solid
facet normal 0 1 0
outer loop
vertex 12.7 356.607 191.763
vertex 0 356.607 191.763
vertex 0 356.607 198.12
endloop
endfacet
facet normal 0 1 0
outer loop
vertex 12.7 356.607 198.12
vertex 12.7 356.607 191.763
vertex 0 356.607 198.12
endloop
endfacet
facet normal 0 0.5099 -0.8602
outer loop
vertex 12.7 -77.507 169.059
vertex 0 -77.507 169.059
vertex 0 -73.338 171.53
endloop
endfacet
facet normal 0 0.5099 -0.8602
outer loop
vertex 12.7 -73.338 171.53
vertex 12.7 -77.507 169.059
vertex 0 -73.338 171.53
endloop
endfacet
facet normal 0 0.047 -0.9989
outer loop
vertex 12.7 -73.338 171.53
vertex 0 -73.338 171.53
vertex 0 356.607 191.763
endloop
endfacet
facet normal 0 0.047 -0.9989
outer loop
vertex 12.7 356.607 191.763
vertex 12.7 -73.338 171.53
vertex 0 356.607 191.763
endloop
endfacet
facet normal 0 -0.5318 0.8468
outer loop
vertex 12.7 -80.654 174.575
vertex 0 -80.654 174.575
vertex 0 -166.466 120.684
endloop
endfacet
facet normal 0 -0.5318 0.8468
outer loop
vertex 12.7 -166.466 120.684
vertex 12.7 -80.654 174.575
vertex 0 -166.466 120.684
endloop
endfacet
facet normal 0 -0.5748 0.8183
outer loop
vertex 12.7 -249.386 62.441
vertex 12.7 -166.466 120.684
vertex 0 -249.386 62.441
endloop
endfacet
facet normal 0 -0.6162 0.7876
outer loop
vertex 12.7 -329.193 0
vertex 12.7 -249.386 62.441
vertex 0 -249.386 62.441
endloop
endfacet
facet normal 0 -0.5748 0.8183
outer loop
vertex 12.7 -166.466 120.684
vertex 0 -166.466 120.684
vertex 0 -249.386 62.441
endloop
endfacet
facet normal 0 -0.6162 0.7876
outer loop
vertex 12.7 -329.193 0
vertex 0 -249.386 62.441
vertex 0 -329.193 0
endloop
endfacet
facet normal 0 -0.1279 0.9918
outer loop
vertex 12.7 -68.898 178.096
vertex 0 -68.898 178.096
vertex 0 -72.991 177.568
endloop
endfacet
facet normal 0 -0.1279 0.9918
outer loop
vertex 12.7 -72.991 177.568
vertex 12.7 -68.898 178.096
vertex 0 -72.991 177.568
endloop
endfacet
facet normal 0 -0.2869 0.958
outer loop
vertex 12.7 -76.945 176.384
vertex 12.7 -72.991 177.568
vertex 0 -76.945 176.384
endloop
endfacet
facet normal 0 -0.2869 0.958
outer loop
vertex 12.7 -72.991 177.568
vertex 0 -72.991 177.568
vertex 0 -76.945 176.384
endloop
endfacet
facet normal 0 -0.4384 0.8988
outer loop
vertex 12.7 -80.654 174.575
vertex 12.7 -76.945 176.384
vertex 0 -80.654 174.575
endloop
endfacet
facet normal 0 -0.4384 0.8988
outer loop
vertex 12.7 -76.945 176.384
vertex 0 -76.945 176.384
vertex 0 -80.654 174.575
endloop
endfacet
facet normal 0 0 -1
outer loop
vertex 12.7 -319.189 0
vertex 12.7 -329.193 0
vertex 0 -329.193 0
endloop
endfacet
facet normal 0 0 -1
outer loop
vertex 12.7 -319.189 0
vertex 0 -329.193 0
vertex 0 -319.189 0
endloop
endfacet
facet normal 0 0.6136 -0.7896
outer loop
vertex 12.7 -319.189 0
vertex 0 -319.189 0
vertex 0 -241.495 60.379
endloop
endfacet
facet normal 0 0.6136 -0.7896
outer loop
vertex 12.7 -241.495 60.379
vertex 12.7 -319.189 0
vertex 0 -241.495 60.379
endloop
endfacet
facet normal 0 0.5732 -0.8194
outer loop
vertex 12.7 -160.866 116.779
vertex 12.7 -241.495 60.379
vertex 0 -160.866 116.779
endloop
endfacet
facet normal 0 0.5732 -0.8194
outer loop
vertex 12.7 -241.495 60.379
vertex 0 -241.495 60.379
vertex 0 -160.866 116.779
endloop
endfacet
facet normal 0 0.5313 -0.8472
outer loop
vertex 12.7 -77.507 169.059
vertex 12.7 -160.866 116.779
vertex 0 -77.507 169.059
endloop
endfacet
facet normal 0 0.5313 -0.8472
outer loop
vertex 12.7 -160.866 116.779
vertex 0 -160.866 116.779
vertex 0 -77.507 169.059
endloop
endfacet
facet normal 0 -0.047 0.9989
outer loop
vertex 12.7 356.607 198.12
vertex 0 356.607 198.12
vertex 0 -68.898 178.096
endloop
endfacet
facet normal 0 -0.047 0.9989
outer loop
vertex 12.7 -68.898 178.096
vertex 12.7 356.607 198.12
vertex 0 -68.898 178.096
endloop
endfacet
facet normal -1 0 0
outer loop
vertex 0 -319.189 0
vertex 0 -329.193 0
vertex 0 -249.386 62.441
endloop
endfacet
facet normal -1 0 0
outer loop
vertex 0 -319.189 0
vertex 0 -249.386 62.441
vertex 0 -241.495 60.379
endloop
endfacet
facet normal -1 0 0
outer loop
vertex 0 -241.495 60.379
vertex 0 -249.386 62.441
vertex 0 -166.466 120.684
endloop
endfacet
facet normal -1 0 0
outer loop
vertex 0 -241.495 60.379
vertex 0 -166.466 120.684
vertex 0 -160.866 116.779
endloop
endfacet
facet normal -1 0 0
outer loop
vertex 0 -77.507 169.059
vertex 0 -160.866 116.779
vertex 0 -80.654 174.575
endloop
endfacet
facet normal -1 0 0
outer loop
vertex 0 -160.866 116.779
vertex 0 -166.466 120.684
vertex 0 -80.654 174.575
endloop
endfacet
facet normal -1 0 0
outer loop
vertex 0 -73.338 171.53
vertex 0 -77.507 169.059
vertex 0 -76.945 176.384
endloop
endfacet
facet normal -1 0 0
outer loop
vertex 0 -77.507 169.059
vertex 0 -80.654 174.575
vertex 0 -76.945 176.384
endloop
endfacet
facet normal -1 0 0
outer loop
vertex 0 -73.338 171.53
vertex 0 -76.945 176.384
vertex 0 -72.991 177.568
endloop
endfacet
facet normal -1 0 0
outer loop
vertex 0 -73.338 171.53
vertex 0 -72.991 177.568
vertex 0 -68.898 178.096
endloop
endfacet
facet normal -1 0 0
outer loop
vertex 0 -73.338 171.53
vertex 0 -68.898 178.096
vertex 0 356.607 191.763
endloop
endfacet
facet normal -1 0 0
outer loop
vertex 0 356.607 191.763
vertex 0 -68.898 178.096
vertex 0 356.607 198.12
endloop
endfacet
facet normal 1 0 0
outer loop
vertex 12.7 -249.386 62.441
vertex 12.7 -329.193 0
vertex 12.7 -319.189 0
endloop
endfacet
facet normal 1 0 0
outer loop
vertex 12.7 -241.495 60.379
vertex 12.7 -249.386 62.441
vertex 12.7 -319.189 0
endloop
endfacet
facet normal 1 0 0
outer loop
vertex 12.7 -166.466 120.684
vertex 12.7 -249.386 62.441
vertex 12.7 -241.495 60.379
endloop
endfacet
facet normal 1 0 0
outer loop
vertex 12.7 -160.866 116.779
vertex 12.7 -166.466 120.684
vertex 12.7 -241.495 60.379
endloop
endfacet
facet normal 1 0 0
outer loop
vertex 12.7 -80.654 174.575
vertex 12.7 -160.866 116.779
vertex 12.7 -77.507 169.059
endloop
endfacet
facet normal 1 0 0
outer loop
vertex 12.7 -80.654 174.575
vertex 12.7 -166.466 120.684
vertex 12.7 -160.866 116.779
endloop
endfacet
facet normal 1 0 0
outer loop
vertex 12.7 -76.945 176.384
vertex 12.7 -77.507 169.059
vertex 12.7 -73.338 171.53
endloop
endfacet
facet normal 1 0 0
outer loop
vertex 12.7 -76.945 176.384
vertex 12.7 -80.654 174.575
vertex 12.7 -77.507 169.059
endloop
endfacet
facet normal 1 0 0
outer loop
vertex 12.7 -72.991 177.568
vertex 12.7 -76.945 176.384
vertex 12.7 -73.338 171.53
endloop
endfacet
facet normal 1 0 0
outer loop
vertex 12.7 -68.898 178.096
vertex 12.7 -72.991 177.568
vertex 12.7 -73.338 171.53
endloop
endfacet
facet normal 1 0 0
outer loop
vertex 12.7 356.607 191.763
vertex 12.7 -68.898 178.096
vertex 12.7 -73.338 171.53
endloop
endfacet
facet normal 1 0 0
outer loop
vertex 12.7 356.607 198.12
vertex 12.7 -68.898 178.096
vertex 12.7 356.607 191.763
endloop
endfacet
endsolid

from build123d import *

# Parameters (mm, degrees)
F1_DEPTH = 12.7


with BuildPart() as f1:
    # F0 (on Right) → F1 (new body)
    with BuildSketch(Plane.YZ):
        with BuildLine():
            ThreePointArc((-68.898448, 178.096197), (-74.992037, 177.056382), (-80.653981, 174.575369))
            ThreePointArc((-80.653981, 174.575369), (-208.301311, 92.096861), (-329.192638, 0))
            Line((-329.192638, 0), (-319.189282, 0))
            ThreePointArc((-319.189282, 0), (-201.534739, 89.085299), (-77.506695, 169.059209))
            Line((-77.506695, 169.059209), (-73.337511, 171.530273))
            Line((-73.337511, 171.530273), (356.607362, 191.762973))
            Line((356.607362, 191.762973), (356.607362, 198.12))
            Line((356.607362, 198.12), (-68.898448, 178.096197))
        make_face()
    extrude(amount=F1_DEPTH)


solid = f1.part
